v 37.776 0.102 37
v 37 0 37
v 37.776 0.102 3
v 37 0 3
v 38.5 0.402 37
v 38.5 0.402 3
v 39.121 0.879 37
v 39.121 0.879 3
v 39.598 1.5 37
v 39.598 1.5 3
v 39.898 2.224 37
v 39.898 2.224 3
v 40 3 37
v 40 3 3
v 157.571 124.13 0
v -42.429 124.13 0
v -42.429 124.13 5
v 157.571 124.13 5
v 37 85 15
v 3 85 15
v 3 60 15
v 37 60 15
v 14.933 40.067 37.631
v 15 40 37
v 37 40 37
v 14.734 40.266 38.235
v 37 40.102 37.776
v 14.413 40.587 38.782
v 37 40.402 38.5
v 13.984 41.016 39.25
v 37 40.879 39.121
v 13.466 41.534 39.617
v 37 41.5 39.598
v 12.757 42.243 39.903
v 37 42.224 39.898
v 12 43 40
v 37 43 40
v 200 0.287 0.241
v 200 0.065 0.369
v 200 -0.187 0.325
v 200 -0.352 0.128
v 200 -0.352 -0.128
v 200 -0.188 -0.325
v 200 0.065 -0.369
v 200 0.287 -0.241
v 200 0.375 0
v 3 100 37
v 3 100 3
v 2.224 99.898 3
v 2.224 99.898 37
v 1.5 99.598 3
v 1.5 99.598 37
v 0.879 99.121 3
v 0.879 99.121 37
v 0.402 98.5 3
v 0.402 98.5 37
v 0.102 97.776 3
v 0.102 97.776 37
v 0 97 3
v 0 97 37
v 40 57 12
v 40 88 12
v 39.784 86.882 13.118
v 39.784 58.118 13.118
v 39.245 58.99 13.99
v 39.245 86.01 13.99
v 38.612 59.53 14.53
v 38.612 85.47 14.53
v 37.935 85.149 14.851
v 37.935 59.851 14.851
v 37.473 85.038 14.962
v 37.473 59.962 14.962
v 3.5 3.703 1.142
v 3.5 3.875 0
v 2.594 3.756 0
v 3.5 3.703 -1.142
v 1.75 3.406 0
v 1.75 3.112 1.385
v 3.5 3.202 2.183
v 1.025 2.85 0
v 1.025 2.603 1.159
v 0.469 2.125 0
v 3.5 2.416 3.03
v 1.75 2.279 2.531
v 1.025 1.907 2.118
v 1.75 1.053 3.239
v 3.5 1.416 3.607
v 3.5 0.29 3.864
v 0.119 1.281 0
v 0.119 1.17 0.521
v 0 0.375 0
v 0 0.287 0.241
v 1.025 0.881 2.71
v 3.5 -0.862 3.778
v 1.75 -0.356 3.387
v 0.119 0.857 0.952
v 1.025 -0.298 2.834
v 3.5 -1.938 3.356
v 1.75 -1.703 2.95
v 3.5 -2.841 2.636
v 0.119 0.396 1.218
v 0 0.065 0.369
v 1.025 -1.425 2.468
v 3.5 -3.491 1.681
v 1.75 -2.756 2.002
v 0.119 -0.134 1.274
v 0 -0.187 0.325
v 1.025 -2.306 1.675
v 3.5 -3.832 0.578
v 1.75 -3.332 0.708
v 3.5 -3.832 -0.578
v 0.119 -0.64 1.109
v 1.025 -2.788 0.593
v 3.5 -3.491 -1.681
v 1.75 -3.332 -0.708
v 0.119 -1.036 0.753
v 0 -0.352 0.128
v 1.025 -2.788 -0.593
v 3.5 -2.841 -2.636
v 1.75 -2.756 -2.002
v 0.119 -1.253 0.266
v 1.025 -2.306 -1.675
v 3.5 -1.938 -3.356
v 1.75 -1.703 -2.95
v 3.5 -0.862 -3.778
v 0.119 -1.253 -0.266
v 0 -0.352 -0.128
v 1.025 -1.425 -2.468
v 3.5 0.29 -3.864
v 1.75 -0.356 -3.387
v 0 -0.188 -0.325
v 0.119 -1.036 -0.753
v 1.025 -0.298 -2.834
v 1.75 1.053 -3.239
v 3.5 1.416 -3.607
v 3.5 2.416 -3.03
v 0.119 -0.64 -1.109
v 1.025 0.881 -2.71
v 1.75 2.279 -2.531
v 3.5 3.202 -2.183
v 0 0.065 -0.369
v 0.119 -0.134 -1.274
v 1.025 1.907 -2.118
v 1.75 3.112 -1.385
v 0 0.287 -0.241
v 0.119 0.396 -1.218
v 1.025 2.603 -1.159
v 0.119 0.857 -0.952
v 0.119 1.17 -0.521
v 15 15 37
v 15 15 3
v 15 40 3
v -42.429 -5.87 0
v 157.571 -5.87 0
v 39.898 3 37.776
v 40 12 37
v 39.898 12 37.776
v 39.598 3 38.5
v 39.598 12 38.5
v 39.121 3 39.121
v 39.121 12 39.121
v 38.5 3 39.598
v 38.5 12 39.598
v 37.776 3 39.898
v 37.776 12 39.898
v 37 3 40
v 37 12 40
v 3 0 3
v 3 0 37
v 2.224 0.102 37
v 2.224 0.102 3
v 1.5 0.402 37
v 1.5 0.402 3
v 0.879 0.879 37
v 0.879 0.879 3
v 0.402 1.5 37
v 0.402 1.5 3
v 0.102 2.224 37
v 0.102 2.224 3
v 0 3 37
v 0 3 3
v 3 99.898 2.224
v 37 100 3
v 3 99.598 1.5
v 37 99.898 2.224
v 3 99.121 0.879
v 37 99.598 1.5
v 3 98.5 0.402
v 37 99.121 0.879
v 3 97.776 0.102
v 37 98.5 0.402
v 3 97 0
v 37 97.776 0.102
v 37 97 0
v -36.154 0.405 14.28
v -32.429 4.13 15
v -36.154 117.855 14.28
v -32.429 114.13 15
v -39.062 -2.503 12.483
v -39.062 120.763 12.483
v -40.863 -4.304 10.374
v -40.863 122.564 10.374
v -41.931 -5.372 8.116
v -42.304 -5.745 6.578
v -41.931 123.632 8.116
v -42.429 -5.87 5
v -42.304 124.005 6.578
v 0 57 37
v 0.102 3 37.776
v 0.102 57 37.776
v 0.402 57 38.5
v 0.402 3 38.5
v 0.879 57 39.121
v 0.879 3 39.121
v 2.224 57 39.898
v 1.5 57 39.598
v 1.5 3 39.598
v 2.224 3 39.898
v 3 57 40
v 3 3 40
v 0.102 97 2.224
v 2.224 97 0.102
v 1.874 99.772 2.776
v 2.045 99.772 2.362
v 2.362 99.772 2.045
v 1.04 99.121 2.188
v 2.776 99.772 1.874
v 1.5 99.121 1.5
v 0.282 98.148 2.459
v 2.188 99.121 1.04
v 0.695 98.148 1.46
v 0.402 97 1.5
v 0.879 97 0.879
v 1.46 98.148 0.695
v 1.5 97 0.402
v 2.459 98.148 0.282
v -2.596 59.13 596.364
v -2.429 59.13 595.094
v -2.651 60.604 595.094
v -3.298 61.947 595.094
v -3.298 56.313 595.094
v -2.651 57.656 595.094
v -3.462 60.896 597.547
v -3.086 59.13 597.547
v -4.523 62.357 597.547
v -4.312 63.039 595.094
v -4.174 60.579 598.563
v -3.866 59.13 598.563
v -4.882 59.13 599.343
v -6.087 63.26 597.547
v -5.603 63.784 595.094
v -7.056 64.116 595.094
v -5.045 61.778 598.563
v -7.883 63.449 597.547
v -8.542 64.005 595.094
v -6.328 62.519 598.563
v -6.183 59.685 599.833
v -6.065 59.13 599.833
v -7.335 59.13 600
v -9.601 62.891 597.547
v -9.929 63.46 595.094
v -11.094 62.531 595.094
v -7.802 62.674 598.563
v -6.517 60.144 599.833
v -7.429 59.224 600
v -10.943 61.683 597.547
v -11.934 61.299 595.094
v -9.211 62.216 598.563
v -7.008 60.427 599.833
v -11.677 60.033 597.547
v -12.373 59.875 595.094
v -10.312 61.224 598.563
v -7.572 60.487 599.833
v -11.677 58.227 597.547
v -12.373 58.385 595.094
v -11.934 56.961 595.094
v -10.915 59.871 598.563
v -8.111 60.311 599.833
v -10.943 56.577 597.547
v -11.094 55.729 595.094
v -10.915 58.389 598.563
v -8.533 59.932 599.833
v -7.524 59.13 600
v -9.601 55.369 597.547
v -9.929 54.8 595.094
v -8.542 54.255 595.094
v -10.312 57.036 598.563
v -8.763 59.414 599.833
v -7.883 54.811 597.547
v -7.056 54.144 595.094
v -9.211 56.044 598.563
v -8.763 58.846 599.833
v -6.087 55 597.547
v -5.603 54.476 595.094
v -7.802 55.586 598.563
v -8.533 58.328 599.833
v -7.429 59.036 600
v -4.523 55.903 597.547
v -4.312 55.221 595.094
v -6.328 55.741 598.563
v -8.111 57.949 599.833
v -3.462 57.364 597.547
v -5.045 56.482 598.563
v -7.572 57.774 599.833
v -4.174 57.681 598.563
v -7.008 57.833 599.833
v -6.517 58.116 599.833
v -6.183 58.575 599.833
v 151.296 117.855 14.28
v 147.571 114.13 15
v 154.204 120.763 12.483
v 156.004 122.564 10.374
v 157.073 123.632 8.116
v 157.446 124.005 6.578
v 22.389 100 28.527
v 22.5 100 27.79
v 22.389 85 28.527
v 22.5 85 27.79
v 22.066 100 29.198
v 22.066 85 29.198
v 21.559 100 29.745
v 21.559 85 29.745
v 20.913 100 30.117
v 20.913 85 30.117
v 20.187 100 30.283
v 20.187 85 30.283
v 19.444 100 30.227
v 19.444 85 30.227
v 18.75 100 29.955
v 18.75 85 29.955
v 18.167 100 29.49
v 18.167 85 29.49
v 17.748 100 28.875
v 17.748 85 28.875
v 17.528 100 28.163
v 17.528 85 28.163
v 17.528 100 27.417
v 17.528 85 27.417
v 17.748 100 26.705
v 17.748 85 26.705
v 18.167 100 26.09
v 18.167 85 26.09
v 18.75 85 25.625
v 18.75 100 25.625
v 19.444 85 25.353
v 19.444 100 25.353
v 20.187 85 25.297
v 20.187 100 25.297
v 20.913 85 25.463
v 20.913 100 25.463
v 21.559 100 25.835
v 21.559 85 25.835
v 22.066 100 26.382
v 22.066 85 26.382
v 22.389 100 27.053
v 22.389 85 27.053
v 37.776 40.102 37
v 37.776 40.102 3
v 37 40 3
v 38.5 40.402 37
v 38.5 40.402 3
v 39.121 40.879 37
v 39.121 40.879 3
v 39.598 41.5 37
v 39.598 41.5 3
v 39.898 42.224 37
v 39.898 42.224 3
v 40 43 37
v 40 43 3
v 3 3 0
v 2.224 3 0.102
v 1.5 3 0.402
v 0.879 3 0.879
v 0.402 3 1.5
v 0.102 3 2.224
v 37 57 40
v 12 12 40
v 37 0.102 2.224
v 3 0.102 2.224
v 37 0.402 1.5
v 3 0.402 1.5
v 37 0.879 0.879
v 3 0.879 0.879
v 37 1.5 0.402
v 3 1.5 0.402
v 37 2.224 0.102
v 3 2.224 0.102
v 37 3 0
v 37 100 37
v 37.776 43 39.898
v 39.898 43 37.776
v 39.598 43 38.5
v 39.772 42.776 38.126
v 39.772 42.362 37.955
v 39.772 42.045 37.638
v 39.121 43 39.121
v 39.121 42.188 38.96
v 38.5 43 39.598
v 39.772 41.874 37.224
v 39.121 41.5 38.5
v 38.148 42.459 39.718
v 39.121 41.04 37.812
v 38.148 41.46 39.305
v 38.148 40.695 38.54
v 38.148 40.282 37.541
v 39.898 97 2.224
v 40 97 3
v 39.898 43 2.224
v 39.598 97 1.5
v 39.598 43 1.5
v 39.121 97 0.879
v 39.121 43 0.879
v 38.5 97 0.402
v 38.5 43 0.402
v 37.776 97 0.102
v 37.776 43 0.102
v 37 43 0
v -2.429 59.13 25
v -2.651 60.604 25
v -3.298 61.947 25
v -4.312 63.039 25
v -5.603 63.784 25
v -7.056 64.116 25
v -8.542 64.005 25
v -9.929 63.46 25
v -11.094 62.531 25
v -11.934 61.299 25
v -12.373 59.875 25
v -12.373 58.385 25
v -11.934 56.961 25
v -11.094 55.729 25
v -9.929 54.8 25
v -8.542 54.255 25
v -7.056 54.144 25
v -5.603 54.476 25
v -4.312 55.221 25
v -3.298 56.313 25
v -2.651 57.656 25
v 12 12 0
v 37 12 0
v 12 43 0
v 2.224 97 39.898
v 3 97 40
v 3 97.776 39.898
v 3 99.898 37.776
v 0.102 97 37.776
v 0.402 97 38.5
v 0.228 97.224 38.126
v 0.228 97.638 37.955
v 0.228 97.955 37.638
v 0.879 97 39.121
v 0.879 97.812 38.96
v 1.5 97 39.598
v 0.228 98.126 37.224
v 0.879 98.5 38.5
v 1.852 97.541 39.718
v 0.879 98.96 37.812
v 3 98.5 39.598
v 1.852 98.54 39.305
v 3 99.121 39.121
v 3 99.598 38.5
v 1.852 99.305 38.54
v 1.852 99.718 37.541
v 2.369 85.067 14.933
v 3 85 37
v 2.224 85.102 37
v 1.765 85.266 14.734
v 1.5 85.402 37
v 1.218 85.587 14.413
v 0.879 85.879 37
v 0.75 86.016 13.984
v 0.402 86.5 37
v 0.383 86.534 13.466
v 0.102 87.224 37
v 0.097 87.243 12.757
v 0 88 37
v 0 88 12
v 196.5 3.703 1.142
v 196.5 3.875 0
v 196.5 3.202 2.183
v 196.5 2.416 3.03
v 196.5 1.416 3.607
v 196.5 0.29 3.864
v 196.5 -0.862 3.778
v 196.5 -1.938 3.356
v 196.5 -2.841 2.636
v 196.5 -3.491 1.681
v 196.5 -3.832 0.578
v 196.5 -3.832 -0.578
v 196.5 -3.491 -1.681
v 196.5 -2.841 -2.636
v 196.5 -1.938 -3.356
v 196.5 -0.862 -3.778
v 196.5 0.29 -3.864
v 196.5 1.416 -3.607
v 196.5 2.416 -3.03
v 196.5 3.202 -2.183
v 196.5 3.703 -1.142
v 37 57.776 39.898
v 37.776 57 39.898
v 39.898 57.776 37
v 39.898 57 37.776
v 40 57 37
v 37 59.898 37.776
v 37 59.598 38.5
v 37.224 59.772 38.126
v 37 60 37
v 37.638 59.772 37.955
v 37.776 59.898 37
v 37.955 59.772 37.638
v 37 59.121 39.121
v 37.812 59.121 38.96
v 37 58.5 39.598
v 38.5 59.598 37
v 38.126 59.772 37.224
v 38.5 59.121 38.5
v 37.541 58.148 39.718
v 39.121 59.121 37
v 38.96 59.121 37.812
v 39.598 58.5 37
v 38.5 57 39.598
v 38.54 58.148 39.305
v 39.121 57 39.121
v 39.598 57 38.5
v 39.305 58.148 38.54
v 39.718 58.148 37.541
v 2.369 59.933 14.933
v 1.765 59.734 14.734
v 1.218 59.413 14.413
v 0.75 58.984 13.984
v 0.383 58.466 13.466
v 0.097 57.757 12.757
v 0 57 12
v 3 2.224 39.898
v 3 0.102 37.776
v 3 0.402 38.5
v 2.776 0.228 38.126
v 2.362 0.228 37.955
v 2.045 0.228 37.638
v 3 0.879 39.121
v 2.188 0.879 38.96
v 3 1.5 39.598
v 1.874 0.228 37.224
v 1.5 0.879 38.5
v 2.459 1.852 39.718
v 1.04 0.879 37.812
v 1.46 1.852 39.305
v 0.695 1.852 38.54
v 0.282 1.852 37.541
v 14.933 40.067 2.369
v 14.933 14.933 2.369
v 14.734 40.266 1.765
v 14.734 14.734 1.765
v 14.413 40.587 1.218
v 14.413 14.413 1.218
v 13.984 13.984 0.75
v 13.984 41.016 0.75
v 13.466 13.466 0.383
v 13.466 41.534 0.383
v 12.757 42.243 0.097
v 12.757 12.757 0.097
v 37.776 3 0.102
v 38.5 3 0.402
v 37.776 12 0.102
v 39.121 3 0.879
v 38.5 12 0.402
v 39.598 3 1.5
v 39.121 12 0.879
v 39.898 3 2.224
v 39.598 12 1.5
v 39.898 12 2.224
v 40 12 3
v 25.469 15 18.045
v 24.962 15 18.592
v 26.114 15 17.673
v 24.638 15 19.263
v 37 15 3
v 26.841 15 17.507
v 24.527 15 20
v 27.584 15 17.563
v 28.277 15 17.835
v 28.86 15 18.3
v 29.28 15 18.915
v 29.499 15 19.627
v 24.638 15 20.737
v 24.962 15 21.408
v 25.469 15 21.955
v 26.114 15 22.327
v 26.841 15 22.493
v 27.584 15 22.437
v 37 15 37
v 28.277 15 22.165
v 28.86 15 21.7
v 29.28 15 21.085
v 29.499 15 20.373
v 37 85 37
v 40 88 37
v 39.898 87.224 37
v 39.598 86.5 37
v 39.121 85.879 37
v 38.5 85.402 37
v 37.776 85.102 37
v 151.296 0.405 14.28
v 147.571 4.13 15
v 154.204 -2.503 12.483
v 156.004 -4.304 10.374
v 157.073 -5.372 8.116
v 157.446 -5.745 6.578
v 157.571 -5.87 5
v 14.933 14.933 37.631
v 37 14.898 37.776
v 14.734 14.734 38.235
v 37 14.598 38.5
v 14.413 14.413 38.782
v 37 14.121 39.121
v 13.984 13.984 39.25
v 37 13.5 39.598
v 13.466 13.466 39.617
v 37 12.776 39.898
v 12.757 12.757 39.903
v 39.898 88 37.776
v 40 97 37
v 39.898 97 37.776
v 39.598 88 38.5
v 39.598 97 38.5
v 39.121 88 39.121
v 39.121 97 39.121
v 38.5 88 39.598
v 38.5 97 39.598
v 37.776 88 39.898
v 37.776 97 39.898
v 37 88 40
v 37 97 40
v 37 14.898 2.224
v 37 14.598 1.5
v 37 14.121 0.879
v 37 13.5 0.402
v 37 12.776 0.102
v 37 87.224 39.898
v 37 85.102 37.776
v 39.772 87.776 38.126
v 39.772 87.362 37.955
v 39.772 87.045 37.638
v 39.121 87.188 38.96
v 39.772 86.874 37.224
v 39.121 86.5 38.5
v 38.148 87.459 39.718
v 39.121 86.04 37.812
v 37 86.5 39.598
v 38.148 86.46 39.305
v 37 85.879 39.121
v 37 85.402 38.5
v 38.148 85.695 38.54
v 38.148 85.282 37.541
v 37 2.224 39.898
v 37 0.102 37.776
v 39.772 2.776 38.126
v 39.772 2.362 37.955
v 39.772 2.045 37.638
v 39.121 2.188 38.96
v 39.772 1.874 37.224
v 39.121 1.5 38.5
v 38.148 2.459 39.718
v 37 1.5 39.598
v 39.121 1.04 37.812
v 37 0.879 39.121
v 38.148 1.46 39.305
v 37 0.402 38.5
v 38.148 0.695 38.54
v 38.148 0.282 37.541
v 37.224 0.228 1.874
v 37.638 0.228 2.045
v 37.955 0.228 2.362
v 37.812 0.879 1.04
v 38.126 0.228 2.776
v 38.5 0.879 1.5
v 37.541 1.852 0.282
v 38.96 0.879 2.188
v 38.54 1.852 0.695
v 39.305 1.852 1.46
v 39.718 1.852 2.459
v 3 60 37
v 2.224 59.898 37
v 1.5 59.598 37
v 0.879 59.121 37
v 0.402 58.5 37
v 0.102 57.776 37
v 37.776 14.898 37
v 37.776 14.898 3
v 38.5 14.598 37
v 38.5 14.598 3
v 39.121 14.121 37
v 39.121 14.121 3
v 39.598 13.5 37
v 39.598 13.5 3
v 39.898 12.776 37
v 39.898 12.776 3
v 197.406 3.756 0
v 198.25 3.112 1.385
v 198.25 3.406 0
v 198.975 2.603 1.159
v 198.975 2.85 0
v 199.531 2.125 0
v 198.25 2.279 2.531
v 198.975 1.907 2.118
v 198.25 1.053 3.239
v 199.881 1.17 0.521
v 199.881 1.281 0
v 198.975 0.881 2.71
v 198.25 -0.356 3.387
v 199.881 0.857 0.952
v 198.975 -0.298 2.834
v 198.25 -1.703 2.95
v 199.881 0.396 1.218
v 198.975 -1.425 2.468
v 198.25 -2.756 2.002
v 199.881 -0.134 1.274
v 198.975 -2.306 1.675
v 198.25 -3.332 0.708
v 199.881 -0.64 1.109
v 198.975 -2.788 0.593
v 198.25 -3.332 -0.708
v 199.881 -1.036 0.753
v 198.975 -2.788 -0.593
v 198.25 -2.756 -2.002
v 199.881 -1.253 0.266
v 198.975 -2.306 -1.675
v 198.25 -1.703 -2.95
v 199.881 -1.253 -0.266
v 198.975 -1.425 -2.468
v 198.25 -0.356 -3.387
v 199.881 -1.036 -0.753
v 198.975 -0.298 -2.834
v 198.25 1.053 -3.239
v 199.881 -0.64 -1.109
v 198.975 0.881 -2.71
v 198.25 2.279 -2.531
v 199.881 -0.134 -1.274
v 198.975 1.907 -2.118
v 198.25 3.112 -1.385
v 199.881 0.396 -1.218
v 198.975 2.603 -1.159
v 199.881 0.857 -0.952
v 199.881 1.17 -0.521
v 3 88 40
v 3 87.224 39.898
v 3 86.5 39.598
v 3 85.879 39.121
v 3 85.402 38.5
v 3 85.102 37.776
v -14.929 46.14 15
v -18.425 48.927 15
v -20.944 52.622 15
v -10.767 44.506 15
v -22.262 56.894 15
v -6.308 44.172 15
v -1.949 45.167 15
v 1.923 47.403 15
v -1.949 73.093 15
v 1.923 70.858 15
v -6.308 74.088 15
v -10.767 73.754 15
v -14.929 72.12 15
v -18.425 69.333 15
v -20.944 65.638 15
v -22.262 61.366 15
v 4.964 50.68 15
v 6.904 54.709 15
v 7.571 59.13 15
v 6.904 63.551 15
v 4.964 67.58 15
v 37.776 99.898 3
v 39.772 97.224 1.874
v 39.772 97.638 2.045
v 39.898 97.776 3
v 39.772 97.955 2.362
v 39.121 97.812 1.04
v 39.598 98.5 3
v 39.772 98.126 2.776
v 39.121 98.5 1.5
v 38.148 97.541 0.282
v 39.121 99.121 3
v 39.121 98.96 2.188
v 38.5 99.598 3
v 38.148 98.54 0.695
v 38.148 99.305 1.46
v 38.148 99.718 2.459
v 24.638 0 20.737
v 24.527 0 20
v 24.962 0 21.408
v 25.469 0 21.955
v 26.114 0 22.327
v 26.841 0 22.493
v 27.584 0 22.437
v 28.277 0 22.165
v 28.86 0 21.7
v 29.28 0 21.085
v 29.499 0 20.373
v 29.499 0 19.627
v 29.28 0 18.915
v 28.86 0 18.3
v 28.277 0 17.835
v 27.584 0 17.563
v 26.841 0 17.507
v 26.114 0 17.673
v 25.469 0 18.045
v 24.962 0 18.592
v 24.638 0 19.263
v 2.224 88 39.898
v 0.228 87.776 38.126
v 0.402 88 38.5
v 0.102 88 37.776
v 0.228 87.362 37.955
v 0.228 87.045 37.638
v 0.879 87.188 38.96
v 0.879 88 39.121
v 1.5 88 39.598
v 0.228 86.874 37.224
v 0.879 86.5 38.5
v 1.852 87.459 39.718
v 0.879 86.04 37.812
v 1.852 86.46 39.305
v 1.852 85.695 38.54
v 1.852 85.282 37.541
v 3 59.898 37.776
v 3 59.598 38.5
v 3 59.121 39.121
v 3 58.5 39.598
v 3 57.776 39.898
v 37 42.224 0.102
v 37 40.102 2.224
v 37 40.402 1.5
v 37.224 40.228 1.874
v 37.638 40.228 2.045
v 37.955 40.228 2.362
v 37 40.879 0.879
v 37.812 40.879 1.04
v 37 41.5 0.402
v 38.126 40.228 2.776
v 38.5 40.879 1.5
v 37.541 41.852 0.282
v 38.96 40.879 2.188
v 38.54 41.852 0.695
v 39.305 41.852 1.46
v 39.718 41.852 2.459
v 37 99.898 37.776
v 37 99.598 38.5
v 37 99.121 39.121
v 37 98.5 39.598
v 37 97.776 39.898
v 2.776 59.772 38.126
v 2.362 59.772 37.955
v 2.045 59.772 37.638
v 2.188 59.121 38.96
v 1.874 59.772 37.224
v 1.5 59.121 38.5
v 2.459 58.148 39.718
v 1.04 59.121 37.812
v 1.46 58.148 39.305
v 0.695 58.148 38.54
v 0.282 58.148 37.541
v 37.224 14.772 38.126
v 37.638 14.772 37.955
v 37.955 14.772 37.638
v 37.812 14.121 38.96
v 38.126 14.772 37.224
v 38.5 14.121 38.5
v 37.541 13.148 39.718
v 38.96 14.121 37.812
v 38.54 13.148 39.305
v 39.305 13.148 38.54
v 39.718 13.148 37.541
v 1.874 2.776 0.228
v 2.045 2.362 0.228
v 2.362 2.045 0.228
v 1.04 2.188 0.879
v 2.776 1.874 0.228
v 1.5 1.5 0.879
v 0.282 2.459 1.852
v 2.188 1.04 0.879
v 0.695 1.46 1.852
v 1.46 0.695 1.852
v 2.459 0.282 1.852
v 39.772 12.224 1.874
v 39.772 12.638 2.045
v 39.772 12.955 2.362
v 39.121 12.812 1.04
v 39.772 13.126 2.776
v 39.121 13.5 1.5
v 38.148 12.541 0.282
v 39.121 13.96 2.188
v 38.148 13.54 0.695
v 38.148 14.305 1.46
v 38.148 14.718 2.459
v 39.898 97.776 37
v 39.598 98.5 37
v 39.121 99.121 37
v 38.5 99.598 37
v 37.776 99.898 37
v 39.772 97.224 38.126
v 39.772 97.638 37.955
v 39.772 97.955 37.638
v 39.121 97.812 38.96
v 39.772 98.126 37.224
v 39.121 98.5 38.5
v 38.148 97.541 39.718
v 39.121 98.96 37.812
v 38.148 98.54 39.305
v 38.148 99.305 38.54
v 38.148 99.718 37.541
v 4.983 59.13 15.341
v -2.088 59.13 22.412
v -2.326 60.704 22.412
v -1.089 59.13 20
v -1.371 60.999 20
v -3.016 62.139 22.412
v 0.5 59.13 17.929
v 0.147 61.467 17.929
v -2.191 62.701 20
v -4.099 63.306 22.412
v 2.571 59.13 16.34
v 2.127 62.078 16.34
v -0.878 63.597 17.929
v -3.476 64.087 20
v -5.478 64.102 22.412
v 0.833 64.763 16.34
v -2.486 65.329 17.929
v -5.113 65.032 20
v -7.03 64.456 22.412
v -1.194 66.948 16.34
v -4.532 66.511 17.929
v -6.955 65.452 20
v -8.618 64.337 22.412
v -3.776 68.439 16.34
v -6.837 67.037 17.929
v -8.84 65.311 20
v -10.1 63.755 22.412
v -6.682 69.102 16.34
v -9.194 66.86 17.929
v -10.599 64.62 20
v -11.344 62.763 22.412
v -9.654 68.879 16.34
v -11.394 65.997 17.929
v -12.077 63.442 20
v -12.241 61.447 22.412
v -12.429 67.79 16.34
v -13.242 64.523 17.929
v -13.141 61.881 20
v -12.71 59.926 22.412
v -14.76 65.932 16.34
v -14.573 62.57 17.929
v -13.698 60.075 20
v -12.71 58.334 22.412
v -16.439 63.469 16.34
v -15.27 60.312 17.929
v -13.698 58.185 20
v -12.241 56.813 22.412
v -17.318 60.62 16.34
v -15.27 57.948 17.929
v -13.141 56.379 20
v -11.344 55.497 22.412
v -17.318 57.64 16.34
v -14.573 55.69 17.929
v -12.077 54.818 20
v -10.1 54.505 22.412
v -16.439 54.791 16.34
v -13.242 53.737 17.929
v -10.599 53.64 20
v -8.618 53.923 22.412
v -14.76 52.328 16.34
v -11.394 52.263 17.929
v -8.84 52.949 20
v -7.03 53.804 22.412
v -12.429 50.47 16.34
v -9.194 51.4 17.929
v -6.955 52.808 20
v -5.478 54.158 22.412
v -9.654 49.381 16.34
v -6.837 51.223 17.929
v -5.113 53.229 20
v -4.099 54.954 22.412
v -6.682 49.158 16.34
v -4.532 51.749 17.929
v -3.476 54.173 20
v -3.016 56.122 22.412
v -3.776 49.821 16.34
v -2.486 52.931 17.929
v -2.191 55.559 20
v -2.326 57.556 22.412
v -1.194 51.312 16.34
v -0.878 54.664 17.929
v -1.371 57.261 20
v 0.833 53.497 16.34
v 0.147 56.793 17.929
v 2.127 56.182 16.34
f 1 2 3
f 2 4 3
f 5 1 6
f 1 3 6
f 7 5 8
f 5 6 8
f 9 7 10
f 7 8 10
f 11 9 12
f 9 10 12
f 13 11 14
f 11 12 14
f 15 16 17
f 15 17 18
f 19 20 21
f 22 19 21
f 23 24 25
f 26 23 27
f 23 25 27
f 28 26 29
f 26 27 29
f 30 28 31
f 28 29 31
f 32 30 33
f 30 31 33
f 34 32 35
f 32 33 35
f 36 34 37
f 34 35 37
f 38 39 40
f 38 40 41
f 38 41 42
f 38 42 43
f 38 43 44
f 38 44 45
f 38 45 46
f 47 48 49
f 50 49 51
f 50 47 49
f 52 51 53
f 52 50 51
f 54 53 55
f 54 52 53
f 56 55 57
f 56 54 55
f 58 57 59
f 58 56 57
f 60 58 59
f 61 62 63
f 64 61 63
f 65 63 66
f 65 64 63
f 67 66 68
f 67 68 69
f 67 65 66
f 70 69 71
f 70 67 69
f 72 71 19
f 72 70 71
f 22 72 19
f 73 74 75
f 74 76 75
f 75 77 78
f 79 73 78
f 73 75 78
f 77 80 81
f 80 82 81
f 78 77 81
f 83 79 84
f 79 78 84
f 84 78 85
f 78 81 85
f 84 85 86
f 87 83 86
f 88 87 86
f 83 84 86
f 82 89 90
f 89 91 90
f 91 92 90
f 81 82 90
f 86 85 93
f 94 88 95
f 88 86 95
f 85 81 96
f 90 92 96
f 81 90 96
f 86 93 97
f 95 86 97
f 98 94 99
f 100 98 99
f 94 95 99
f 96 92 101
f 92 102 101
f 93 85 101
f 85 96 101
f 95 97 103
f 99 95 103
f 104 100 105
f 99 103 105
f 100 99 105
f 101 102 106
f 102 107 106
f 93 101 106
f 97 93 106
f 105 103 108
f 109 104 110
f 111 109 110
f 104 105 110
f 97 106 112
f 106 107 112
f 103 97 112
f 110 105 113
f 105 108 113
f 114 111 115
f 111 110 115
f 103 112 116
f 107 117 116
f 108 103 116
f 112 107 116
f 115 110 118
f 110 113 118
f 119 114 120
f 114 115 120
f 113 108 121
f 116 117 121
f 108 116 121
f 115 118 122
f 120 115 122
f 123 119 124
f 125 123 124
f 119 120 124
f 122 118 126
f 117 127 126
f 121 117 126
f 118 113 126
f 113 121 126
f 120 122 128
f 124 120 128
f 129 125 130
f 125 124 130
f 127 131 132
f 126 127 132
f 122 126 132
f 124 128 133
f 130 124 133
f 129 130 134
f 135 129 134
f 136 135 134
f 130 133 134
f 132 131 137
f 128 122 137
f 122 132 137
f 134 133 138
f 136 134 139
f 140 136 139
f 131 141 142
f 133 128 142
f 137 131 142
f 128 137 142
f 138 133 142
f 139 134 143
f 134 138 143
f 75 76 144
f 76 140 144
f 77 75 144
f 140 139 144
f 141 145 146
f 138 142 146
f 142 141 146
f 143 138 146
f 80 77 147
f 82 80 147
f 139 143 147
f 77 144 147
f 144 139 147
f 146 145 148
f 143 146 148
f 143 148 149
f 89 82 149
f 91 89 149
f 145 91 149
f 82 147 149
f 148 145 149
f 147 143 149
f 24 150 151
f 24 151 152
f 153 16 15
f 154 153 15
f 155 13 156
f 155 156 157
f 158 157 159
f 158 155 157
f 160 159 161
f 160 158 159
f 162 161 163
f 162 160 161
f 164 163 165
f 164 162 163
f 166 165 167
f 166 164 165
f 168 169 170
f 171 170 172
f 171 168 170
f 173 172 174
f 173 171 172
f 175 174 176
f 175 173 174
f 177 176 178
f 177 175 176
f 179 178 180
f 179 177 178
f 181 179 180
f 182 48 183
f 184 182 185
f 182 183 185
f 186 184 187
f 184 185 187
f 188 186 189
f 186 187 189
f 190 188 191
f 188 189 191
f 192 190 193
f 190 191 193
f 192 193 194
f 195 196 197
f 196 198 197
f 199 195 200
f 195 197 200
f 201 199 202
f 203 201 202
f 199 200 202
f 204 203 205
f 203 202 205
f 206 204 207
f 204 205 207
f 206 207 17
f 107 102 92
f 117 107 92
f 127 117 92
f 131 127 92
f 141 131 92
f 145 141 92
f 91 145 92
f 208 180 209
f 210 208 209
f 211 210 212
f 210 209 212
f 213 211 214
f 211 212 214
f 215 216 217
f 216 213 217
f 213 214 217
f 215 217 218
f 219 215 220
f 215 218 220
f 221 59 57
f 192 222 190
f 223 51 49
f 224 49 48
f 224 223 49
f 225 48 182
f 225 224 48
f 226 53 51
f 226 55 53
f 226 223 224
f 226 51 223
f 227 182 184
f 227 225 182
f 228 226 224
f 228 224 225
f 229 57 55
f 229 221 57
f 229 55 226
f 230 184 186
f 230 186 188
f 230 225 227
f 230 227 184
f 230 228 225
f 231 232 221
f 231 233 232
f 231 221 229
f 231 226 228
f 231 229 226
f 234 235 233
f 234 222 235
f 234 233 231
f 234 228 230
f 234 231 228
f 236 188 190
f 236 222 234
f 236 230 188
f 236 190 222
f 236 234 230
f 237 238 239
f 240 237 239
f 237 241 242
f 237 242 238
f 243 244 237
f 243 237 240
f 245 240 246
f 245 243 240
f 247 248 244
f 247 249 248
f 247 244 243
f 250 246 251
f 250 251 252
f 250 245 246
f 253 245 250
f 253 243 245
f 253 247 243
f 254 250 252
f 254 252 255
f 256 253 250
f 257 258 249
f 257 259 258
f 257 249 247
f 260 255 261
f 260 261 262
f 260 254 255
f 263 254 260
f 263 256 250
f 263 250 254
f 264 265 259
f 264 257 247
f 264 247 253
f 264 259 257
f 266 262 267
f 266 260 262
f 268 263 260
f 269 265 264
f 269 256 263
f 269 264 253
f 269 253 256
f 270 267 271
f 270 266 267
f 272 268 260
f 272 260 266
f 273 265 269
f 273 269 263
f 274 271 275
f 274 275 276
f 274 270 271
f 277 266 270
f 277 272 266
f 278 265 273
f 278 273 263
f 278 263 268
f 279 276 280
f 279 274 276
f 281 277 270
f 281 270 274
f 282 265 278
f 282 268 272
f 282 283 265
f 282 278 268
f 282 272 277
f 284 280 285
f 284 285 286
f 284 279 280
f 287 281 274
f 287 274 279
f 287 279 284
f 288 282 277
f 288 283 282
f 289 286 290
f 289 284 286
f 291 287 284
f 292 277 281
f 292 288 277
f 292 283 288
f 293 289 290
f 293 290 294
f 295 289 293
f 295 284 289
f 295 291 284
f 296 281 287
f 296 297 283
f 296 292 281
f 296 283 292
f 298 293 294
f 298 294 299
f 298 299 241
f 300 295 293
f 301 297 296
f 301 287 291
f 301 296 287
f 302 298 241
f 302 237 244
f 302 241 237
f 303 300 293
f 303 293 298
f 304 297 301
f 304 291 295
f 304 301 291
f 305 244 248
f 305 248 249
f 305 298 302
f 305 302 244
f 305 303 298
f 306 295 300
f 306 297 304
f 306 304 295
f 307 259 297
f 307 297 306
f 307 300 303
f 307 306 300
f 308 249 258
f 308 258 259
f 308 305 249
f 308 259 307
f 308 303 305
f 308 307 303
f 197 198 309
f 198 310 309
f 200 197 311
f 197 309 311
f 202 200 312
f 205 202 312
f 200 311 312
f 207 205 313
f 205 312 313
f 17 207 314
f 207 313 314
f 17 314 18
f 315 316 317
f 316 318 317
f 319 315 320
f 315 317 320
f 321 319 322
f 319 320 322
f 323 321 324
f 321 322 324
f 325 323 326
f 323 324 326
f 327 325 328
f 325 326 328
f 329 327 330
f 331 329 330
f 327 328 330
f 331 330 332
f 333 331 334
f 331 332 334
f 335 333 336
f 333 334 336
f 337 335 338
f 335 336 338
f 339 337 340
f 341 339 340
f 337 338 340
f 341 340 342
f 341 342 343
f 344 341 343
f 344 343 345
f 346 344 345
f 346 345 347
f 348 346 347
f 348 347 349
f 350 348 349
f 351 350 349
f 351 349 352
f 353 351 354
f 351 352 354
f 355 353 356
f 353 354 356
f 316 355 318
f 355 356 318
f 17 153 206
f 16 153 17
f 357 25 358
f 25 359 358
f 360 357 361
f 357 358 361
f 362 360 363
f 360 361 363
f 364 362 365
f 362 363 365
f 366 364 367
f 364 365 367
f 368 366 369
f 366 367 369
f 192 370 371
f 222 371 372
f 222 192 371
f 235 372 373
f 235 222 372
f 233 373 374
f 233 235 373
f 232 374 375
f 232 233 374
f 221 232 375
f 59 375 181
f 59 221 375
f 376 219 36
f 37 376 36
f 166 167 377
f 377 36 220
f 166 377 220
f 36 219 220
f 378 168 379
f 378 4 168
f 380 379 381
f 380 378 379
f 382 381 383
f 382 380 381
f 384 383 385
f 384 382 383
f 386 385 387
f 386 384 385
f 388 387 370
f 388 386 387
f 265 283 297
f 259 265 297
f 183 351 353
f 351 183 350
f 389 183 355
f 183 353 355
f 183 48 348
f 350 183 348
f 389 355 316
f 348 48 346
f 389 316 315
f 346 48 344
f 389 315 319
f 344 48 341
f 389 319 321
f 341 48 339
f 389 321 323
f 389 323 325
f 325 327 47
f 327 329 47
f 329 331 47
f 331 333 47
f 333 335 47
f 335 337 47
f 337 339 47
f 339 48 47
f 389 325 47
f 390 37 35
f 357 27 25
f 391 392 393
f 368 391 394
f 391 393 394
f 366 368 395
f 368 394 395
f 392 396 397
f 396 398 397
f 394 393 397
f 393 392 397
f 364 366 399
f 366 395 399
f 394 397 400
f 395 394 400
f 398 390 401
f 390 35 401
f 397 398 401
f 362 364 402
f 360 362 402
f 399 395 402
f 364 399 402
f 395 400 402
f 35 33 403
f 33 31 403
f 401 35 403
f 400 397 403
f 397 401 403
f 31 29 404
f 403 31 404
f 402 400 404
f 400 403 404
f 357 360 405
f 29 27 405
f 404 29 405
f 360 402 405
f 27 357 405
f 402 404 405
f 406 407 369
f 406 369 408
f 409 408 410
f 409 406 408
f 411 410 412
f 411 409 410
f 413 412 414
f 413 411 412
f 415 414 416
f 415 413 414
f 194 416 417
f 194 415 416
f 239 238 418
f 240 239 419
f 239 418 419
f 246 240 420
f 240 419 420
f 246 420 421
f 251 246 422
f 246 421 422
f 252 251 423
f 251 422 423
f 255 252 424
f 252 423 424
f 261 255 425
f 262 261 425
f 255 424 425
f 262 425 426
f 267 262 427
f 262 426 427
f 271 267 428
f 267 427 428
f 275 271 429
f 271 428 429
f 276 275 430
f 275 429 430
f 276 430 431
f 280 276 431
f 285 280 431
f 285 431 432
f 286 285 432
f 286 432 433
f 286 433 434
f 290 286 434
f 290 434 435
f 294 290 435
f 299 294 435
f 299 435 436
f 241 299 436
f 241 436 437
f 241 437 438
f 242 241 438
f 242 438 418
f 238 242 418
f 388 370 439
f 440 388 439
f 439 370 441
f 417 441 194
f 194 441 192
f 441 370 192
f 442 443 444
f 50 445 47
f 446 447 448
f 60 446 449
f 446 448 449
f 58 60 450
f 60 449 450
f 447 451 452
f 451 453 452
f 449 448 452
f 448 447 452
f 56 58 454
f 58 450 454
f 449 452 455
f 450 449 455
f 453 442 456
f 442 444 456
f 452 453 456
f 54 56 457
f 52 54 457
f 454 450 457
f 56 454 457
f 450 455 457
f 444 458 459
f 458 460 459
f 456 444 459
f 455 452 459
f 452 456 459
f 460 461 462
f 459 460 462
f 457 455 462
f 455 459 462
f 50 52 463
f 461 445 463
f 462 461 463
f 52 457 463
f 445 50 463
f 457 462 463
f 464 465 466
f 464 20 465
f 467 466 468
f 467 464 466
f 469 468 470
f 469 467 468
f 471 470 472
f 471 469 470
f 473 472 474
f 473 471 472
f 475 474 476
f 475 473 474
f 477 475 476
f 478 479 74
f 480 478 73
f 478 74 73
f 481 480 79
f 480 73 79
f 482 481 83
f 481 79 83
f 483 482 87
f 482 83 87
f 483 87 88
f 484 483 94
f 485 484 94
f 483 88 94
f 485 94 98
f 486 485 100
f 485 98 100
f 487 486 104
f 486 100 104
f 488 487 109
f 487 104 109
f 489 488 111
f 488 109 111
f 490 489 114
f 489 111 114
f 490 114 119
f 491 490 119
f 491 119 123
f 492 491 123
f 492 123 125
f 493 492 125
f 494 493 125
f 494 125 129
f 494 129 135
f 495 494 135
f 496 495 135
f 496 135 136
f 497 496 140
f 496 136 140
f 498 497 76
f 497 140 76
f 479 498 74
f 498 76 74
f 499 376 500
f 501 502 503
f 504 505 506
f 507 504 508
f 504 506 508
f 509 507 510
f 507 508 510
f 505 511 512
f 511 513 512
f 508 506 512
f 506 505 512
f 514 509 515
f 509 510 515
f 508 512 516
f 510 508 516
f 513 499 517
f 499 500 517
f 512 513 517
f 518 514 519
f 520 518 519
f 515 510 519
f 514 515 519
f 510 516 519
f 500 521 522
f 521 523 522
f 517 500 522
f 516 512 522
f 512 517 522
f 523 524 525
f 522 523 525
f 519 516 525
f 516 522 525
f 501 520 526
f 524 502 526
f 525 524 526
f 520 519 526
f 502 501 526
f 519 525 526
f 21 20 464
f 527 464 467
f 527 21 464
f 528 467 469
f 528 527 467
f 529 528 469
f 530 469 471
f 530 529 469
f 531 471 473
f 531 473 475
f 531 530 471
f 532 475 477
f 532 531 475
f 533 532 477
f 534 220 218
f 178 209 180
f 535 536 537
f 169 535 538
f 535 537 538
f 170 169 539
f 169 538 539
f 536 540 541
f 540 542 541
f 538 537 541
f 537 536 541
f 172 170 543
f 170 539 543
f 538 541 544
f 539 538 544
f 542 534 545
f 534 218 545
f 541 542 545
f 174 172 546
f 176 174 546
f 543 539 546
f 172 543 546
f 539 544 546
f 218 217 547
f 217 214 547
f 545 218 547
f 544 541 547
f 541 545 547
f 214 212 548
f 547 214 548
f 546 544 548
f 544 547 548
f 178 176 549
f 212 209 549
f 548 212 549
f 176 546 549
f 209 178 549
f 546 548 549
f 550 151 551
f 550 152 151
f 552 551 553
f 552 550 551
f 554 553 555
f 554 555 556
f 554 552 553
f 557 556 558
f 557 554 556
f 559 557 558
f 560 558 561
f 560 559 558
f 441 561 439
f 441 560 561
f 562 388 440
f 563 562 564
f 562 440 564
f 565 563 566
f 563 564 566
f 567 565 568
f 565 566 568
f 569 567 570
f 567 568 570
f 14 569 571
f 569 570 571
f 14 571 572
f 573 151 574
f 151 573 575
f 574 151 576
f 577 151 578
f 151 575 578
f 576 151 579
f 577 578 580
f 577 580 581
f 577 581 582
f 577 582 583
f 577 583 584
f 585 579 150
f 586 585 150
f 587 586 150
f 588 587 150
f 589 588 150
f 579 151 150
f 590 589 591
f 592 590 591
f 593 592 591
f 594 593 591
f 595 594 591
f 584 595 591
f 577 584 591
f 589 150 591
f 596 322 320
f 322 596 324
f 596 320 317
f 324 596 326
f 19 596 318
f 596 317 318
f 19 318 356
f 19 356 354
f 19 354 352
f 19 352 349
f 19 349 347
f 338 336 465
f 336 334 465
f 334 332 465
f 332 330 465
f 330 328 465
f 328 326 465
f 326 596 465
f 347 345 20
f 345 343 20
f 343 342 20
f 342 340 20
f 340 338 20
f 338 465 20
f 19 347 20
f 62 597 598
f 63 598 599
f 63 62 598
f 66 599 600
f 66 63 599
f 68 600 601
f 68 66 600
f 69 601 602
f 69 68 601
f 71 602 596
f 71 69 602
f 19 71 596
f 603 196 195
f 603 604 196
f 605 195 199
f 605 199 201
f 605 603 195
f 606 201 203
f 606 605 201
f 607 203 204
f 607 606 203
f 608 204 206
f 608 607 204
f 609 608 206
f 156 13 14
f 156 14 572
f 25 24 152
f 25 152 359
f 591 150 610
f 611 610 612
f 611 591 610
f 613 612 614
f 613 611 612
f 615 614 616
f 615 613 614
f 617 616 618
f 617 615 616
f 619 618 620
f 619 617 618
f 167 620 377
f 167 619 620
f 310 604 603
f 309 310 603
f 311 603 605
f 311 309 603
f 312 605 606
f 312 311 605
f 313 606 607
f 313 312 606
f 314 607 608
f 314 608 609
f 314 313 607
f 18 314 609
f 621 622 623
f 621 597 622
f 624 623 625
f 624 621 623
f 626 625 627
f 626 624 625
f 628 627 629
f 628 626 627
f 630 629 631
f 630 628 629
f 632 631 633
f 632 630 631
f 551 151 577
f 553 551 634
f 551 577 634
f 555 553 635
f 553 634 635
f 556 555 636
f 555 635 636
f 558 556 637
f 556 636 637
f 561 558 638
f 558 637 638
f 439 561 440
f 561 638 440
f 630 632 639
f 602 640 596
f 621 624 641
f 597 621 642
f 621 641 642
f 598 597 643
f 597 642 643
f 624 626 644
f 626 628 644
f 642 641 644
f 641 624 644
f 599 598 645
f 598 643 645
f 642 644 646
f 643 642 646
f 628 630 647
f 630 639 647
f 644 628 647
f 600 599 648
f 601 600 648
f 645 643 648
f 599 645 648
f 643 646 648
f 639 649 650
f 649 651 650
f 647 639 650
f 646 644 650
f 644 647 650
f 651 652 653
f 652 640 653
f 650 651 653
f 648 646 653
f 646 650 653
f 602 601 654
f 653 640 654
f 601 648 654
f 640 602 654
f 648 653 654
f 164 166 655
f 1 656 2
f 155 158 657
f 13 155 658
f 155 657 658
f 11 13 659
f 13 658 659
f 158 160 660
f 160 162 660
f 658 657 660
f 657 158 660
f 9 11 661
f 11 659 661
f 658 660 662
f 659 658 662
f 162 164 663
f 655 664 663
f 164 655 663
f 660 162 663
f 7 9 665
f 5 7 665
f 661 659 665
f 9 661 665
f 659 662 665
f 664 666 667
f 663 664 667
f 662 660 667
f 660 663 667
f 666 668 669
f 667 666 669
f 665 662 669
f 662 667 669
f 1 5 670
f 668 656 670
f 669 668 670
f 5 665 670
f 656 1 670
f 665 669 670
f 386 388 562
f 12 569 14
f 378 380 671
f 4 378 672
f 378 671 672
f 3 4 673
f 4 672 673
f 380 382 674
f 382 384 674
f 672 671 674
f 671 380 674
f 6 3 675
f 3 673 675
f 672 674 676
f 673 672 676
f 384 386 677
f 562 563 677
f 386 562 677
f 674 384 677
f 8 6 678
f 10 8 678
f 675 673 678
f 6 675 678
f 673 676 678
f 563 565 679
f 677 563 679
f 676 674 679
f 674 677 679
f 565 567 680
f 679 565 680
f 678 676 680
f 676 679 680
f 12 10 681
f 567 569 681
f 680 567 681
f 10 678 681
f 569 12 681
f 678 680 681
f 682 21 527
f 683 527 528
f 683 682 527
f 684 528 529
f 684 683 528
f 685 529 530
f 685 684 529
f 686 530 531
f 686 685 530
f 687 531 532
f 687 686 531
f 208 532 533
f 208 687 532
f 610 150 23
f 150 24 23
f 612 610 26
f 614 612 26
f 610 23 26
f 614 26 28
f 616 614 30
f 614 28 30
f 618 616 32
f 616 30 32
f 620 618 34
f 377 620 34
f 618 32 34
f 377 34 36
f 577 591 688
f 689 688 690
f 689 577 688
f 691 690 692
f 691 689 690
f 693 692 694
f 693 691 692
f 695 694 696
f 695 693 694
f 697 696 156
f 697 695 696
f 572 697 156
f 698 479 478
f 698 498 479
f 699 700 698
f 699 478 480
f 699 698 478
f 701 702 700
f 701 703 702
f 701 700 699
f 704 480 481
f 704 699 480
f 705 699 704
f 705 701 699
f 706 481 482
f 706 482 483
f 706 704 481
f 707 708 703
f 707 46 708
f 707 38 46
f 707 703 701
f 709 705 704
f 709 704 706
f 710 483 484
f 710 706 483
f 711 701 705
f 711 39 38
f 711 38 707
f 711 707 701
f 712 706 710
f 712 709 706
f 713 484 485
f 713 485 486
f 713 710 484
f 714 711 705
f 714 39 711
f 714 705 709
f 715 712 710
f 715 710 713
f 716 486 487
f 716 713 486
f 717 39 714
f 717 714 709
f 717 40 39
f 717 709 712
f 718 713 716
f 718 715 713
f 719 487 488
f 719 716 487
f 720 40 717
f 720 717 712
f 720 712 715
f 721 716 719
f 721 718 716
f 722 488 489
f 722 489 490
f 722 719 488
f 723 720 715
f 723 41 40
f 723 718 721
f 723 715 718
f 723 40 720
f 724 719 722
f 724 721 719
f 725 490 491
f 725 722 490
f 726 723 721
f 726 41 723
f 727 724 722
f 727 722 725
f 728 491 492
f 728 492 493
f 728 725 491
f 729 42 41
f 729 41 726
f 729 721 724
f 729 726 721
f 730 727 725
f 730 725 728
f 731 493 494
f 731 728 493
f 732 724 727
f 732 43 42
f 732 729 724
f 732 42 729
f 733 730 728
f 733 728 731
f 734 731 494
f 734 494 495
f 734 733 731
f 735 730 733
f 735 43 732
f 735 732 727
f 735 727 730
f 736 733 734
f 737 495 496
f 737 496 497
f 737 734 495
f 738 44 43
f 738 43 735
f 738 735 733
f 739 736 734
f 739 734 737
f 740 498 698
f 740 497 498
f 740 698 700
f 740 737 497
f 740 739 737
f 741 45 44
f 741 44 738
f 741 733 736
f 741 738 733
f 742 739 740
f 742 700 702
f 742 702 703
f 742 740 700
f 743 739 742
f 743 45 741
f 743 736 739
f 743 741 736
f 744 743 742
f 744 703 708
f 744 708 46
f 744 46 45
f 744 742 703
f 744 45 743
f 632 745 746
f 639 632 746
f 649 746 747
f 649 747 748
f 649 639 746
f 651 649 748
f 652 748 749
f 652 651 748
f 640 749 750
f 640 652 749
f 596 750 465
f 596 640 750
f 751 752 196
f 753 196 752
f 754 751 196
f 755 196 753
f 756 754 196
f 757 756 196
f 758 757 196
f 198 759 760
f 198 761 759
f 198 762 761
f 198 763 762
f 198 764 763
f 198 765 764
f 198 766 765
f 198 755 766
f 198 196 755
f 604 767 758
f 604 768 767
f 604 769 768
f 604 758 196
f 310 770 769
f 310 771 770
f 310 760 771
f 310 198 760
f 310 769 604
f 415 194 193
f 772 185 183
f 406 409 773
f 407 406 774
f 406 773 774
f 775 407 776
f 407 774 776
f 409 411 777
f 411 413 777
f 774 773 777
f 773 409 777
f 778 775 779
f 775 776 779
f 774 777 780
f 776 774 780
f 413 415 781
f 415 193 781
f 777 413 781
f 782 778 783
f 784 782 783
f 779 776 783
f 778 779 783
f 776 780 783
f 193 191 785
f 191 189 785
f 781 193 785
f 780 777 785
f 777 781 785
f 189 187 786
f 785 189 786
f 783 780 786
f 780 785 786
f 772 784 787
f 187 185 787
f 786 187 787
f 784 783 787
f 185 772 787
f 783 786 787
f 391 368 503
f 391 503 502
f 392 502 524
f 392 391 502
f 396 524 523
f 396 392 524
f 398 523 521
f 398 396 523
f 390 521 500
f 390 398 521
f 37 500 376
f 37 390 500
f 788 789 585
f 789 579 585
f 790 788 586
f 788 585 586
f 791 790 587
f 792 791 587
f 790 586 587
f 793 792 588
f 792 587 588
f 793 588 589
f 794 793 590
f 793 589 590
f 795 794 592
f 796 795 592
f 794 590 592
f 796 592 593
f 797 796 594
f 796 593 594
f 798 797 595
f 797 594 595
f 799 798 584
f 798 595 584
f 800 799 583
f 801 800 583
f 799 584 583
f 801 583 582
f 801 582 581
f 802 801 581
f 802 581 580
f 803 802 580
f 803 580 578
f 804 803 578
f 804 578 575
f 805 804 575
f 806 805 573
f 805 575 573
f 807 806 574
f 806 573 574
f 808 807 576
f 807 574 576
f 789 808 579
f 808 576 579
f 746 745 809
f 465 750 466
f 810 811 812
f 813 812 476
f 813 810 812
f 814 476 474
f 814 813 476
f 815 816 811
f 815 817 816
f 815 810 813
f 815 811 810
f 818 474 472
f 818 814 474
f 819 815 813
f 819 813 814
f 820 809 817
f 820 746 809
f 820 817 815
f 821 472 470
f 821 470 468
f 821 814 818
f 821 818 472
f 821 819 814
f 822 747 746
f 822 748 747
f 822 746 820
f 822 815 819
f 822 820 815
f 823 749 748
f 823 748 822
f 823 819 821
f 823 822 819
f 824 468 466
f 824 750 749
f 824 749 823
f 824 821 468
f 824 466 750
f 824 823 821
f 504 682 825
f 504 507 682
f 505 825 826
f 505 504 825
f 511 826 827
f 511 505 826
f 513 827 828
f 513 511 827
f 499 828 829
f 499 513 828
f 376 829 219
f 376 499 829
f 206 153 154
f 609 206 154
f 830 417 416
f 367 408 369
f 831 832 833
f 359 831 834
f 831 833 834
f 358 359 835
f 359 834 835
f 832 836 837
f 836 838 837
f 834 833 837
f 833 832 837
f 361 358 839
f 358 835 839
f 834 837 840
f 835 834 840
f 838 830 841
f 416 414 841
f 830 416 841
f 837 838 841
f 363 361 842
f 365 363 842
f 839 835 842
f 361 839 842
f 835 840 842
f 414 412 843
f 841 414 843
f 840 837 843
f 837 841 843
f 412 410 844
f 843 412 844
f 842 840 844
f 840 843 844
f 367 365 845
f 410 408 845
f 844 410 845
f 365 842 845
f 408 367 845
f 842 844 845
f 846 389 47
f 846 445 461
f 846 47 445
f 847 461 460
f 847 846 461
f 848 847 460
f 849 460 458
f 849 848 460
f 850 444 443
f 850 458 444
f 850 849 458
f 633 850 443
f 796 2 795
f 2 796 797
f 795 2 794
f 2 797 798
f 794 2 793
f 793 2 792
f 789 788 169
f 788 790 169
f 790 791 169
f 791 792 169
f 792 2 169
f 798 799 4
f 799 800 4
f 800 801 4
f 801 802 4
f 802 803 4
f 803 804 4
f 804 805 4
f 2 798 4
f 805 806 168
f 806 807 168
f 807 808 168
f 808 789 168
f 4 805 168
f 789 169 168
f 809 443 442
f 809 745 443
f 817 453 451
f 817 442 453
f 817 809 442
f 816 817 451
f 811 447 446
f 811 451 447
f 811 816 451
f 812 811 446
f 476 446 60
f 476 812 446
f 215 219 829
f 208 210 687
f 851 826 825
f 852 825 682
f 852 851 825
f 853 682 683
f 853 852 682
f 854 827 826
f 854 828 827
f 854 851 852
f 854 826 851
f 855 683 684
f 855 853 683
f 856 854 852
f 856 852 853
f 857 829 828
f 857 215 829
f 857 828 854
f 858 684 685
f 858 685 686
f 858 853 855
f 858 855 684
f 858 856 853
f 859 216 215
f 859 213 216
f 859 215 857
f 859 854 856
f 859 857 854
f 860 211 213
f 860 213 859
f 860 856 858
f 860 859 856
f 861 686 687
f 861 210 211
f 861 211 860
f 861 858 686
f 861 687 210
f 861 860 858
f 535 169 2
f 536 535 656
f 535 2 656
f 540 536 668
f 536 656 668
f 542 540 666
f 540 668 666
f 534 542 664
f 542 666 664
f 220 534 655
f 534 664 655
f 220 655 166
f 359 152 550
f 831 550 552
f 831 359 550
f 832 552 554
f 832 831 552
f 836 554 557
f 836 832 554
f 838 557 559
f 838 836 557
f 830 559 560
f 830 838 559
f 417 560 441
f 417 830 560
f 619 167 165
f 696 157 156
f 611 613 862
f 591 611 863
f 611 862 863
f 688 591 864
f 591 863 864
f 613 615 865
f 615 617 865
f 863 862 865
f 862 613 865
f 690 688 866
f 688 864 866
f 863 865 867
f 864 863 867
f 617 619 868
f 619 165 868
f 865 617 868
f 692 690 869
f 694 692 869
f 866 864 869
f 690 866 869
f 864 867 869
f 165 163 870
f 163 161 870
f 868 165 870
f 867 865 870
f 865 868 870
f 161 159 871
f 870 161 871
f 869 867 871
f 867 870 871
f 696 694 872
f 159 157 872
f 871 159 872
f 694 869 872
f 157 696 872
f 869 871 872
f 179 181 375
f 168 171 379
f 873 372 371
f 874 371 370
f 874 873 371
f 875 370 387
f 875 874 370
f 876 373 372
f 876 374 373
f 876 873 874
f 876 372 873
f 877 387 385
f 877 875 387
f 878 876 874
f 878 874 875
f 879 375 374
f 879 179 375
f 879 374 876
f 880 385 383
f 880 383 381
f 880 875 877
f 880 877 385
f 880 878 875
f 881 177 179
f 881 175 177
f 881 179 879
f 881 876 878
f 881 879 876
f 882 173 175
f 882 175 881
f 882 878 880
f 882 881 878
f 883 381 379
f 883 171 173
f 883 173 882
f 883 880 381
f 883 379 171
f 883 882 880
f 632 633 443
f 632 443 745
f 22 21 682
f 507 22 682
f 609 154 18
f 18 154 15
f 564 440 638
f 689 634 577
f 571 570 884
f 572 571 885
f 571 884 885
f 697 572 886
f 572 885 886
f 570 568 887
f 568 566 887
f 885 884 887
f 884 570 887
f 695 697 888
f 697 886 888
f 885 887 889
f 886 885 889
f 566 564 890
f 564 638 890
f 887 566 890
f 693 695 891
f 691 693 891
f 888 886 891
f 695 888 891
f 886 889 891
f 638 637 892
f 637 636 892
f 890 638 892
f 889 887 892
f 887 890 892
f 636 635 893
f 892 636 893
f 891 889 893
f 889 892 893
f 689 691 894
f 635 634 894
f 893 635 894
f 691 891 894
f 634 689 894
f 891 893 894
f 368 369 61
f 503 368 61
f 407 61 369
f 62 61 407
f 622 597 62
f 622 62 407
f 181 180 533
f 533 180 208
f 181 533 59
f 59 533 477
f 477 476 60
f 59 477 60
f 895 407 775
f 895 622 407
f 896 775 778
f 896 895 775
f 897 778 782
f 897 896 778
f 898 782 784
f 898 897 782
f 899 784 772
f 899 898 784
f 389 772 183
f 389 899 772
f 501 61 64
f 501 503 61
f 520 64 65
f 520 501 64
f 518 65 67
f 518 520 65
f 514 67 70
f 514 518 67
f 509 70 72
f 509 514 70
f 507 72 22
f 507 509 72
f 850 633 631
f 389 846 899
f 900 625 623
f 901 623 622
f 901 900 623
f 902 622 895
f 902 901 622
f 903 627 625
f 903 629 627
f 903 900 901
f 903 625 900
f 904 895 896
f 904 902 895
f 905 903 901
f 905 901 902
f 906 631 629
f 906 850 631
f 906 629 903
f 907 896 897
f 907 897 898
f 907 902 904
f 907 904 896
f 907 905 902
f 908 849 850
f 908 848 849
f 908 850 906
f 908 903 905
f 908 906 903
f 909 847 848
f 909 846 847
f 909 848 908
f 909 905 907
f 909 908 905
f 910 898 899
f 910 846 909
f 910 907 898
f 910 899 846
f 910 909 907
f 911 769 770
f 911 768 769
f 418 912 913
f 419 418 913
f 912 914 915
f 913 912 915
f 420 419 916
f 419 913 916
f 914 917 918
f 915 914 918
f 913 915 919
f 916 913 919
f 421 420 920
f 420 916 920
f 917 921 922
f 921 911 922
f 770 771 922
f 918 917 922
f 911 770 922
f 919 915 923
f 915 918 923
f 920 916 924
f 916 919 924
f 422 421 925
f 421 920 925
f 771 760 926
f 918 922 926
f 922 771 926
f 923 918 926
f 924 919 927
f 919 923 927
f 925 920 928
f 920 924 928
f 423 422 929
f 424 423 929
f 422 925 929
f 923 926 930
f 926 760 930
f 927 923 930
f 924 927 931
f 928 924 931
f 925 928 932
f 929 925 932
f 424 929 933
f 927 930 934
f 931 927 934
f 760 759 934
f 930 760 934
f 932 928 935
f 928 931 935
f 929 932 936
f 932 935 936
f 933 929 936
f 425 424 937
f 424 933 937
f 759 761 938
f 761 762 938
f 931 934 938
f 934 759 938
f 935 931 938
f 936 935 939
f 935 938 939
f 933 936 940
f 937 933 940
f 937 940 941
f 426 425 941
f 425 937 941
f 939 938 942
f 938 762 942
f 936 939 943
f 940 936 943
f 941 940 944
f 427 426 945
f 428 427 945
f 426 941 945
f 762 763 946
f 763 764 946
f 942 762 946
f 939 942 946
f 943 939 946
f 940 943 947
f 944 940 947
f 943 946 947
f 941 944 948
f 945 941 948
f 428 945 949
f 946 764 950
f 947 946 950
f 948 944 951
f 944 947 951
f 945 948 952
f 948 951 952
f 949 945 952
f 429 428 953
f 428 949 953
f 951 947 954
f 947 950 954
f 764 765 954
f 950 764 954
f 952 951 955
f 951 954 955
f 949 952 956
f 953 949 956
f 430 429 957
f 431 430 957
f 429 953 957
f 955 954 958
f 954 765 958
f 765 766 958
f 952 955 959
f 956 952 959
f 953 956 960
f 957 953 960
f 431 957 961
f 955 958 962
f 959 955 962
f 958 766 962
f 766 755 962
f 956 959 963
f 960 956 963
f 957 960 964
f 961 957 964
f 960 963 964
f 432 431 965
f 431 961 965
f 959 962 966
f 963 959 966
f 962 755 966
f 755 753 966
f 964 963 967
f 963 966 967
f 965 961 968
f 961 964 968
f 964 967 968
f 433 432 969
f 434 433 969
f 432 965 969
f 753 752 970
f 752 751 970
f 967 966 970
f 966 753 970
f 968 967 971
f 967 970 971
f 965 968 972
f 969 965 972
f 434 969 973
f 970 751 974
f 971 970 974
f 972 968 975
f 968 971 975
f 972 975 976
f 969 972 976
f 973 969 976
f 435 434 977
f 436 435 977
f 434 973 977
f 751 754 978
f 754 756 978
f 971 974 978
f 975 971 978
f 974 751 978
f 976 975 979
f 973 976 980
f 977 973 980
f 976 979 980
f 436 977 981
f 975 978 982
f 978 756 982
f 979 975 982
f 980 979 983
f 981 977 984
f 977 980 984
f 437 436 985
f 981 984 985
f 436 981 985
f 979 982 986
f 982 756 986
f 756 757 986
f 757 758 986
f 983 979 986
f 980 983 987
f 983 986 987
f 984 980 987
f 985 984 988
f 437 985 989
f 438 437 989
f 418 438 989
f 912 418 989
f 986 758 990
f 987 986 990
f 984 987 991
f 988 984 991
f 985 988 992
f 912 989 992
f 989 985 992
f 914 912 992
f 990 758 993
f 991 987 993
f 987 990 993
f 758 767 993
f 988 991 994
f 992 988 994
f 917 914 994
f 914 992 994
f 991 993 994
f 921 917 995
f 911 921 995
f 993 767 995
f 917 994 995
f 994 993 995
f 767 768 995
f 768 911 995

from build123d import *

# Parameters (mm, degrees)
F0_W      = 200
F0_H      = 130
F0_R      = 5
F1_DEPTH  = 15
F2_DEPTH  = 600
F3_R      = 10
F4_R      = 4.9056819587
F6_DEPTH  = 40
F7_W      = 25
F7_H      = 25
F8_DEPTH  = 40
F10_D     = 5
F10_DEPTH = 15
F10_TIP   = 1.5021515476
F12_D     = 5
F12_DEPTH = 15
F12_TIP   = 1.5021515476
F13_R     = 3
F14_R     = 3.875
F15_DEPTH = 200
F16_R     = 3.5


with BuildPart() as f1:
    # F0 (on Top) → F1 (new body)
    with BuildSketch(Plane.XY):
        with Locations((57.5707746297, 59.1300514607)):
            Rectangle(F0_W, F0_H)
        with Locations((-7.4292253703, 59.1300514607)):
            Circle(F0_R, mode=Mode.SUBTRACT)
    extrude(amount=F1_DEPTH)

    # F0 (on Top) → F2 (join)
    with BuildSketch(Plane.XY):
        with Locations((-7.4292253703, 59.1300514607)):
            Circle(F0_R)
    extrude(amount=F2_DEPTH)

    # F3
    f3_edges = [f1.edges().sort_by_distance(p)[0] for p in [
        (157.570775, 59.130051, 15),
        (57.570775, 124.130051, 15),
        (-42.429225, 59.130051, 15),
        (57.570775, -5.869949, 15),
        (-12.429225, 59.130051, 15),
    ]]
    fillet(f3_edges, radius=F3_R)

    # F4
    f4_edges = [f1.edges().sort_by_distance(p)[0] for p in [
        (-12.429225, 59.130051, 600),
    ]]
    fillet(f4_edges, radius=F4_R)


with BuildPart() as f6:
    # F5 (on Right) → F6 (new body)
    with BuildSketch(Plane.YZ):
        Polygon((0, 40), (0, 0), (100, 0), (100, 40), (85, 40), (85, 15), (60, 15), (60, 40), align=None)
    extrude(amount=F6_DEPTH)

    # F7 (on face) → F8 (cut)
    with BuildSketch(Plane.XY.offset(40)):
        with Locations((27.5, 27.5)):
            Rectangle(F7_W, F7_H)
    extrude(amount=-F8_DEPTH, mode=Mode.SUBTRACT)

    # F10
    with Locations(Plane.XZ):
        with Locations((27.0274095237, 20)):
            Hole(F10_D / 2, depth=F10_DEPTH)
            with Locations((0, 0, -(F10_DEPTH + F10_TIP / 2))):  # 118° drill point
                Cone(0, F10_D / 2, F10_TIP, mode=Mode.SUBTRACT)

    # F12
    with Locations(Plane(origin=(0, 100, 0), x_dir=(-1, 0, 0), z_dir=(0, 1, 0))):
        with Locations((-20, 27.7899727225)):
            Hole(F12_D / 2, depth=F12_DEPTH)
            with Locations((0, 0, -(F12_DEPTH + F12_TIP / 2))):  # 118° drill point
                Cone(0, F12_D / 2, F12_TIP, mode=Mode.SUBTRACT)

    # F13
    f13_edges = [f6.edges().sort_by_distance(p)[0] for p in [
        (0, 30, 40),
        (20, 0, 40),
        (40, 7.5, 40),
        (27.5, 15, 40),
        (15, 27.5, 40),
        (27.5, 40, 40),
        (40, 50, 40),
        (20, 60, 40),
        (20, 100, 40),
        (20, 85, 40),
        (0, 92.5, 40),
        (40, 92.5, 40),
        (0, 0, 20),
        (0, 50, 0),
        (0, 100, 20),
        (0, 85, 27.5),
        (0, 72.5, 15),
        (0, 60, 27.5),
        (20, 100, 0),
        (40, 70, 0),
        (27.5, 40, 0),
        (15, 27.5, 0),
        (27.5, 15, 0),
        (40, 7.5, 0),
        (20, 0, 0),
        (40, 15, 20),
        (40, 0, 20),
        (40, 60, 27.5),
        (40, 72.5, 15),
        (40, 85, 27.5),
        (40, 100, 20),
        (40, 40, 20),
    ]]
    fillet(f13_edges, radius=F13_R)


with BuildPart() as f15:
    # F14 (on Right) → F15 (new body)
    with BuildSketch(Plane.YZ):
        Circle(F14_R)
    extrude(amount=F15_DEPTH)

    # F16
    f16_edges = [f15.edges().sort_by_distance(p)[0] for p in [
        (0, -3.875, 0),
        (200, -3.875, 0),
    ]]
    fillet(f16_edges, radius=F16_R)


solid = Compound([f1.part, f6.part, f15.part])
